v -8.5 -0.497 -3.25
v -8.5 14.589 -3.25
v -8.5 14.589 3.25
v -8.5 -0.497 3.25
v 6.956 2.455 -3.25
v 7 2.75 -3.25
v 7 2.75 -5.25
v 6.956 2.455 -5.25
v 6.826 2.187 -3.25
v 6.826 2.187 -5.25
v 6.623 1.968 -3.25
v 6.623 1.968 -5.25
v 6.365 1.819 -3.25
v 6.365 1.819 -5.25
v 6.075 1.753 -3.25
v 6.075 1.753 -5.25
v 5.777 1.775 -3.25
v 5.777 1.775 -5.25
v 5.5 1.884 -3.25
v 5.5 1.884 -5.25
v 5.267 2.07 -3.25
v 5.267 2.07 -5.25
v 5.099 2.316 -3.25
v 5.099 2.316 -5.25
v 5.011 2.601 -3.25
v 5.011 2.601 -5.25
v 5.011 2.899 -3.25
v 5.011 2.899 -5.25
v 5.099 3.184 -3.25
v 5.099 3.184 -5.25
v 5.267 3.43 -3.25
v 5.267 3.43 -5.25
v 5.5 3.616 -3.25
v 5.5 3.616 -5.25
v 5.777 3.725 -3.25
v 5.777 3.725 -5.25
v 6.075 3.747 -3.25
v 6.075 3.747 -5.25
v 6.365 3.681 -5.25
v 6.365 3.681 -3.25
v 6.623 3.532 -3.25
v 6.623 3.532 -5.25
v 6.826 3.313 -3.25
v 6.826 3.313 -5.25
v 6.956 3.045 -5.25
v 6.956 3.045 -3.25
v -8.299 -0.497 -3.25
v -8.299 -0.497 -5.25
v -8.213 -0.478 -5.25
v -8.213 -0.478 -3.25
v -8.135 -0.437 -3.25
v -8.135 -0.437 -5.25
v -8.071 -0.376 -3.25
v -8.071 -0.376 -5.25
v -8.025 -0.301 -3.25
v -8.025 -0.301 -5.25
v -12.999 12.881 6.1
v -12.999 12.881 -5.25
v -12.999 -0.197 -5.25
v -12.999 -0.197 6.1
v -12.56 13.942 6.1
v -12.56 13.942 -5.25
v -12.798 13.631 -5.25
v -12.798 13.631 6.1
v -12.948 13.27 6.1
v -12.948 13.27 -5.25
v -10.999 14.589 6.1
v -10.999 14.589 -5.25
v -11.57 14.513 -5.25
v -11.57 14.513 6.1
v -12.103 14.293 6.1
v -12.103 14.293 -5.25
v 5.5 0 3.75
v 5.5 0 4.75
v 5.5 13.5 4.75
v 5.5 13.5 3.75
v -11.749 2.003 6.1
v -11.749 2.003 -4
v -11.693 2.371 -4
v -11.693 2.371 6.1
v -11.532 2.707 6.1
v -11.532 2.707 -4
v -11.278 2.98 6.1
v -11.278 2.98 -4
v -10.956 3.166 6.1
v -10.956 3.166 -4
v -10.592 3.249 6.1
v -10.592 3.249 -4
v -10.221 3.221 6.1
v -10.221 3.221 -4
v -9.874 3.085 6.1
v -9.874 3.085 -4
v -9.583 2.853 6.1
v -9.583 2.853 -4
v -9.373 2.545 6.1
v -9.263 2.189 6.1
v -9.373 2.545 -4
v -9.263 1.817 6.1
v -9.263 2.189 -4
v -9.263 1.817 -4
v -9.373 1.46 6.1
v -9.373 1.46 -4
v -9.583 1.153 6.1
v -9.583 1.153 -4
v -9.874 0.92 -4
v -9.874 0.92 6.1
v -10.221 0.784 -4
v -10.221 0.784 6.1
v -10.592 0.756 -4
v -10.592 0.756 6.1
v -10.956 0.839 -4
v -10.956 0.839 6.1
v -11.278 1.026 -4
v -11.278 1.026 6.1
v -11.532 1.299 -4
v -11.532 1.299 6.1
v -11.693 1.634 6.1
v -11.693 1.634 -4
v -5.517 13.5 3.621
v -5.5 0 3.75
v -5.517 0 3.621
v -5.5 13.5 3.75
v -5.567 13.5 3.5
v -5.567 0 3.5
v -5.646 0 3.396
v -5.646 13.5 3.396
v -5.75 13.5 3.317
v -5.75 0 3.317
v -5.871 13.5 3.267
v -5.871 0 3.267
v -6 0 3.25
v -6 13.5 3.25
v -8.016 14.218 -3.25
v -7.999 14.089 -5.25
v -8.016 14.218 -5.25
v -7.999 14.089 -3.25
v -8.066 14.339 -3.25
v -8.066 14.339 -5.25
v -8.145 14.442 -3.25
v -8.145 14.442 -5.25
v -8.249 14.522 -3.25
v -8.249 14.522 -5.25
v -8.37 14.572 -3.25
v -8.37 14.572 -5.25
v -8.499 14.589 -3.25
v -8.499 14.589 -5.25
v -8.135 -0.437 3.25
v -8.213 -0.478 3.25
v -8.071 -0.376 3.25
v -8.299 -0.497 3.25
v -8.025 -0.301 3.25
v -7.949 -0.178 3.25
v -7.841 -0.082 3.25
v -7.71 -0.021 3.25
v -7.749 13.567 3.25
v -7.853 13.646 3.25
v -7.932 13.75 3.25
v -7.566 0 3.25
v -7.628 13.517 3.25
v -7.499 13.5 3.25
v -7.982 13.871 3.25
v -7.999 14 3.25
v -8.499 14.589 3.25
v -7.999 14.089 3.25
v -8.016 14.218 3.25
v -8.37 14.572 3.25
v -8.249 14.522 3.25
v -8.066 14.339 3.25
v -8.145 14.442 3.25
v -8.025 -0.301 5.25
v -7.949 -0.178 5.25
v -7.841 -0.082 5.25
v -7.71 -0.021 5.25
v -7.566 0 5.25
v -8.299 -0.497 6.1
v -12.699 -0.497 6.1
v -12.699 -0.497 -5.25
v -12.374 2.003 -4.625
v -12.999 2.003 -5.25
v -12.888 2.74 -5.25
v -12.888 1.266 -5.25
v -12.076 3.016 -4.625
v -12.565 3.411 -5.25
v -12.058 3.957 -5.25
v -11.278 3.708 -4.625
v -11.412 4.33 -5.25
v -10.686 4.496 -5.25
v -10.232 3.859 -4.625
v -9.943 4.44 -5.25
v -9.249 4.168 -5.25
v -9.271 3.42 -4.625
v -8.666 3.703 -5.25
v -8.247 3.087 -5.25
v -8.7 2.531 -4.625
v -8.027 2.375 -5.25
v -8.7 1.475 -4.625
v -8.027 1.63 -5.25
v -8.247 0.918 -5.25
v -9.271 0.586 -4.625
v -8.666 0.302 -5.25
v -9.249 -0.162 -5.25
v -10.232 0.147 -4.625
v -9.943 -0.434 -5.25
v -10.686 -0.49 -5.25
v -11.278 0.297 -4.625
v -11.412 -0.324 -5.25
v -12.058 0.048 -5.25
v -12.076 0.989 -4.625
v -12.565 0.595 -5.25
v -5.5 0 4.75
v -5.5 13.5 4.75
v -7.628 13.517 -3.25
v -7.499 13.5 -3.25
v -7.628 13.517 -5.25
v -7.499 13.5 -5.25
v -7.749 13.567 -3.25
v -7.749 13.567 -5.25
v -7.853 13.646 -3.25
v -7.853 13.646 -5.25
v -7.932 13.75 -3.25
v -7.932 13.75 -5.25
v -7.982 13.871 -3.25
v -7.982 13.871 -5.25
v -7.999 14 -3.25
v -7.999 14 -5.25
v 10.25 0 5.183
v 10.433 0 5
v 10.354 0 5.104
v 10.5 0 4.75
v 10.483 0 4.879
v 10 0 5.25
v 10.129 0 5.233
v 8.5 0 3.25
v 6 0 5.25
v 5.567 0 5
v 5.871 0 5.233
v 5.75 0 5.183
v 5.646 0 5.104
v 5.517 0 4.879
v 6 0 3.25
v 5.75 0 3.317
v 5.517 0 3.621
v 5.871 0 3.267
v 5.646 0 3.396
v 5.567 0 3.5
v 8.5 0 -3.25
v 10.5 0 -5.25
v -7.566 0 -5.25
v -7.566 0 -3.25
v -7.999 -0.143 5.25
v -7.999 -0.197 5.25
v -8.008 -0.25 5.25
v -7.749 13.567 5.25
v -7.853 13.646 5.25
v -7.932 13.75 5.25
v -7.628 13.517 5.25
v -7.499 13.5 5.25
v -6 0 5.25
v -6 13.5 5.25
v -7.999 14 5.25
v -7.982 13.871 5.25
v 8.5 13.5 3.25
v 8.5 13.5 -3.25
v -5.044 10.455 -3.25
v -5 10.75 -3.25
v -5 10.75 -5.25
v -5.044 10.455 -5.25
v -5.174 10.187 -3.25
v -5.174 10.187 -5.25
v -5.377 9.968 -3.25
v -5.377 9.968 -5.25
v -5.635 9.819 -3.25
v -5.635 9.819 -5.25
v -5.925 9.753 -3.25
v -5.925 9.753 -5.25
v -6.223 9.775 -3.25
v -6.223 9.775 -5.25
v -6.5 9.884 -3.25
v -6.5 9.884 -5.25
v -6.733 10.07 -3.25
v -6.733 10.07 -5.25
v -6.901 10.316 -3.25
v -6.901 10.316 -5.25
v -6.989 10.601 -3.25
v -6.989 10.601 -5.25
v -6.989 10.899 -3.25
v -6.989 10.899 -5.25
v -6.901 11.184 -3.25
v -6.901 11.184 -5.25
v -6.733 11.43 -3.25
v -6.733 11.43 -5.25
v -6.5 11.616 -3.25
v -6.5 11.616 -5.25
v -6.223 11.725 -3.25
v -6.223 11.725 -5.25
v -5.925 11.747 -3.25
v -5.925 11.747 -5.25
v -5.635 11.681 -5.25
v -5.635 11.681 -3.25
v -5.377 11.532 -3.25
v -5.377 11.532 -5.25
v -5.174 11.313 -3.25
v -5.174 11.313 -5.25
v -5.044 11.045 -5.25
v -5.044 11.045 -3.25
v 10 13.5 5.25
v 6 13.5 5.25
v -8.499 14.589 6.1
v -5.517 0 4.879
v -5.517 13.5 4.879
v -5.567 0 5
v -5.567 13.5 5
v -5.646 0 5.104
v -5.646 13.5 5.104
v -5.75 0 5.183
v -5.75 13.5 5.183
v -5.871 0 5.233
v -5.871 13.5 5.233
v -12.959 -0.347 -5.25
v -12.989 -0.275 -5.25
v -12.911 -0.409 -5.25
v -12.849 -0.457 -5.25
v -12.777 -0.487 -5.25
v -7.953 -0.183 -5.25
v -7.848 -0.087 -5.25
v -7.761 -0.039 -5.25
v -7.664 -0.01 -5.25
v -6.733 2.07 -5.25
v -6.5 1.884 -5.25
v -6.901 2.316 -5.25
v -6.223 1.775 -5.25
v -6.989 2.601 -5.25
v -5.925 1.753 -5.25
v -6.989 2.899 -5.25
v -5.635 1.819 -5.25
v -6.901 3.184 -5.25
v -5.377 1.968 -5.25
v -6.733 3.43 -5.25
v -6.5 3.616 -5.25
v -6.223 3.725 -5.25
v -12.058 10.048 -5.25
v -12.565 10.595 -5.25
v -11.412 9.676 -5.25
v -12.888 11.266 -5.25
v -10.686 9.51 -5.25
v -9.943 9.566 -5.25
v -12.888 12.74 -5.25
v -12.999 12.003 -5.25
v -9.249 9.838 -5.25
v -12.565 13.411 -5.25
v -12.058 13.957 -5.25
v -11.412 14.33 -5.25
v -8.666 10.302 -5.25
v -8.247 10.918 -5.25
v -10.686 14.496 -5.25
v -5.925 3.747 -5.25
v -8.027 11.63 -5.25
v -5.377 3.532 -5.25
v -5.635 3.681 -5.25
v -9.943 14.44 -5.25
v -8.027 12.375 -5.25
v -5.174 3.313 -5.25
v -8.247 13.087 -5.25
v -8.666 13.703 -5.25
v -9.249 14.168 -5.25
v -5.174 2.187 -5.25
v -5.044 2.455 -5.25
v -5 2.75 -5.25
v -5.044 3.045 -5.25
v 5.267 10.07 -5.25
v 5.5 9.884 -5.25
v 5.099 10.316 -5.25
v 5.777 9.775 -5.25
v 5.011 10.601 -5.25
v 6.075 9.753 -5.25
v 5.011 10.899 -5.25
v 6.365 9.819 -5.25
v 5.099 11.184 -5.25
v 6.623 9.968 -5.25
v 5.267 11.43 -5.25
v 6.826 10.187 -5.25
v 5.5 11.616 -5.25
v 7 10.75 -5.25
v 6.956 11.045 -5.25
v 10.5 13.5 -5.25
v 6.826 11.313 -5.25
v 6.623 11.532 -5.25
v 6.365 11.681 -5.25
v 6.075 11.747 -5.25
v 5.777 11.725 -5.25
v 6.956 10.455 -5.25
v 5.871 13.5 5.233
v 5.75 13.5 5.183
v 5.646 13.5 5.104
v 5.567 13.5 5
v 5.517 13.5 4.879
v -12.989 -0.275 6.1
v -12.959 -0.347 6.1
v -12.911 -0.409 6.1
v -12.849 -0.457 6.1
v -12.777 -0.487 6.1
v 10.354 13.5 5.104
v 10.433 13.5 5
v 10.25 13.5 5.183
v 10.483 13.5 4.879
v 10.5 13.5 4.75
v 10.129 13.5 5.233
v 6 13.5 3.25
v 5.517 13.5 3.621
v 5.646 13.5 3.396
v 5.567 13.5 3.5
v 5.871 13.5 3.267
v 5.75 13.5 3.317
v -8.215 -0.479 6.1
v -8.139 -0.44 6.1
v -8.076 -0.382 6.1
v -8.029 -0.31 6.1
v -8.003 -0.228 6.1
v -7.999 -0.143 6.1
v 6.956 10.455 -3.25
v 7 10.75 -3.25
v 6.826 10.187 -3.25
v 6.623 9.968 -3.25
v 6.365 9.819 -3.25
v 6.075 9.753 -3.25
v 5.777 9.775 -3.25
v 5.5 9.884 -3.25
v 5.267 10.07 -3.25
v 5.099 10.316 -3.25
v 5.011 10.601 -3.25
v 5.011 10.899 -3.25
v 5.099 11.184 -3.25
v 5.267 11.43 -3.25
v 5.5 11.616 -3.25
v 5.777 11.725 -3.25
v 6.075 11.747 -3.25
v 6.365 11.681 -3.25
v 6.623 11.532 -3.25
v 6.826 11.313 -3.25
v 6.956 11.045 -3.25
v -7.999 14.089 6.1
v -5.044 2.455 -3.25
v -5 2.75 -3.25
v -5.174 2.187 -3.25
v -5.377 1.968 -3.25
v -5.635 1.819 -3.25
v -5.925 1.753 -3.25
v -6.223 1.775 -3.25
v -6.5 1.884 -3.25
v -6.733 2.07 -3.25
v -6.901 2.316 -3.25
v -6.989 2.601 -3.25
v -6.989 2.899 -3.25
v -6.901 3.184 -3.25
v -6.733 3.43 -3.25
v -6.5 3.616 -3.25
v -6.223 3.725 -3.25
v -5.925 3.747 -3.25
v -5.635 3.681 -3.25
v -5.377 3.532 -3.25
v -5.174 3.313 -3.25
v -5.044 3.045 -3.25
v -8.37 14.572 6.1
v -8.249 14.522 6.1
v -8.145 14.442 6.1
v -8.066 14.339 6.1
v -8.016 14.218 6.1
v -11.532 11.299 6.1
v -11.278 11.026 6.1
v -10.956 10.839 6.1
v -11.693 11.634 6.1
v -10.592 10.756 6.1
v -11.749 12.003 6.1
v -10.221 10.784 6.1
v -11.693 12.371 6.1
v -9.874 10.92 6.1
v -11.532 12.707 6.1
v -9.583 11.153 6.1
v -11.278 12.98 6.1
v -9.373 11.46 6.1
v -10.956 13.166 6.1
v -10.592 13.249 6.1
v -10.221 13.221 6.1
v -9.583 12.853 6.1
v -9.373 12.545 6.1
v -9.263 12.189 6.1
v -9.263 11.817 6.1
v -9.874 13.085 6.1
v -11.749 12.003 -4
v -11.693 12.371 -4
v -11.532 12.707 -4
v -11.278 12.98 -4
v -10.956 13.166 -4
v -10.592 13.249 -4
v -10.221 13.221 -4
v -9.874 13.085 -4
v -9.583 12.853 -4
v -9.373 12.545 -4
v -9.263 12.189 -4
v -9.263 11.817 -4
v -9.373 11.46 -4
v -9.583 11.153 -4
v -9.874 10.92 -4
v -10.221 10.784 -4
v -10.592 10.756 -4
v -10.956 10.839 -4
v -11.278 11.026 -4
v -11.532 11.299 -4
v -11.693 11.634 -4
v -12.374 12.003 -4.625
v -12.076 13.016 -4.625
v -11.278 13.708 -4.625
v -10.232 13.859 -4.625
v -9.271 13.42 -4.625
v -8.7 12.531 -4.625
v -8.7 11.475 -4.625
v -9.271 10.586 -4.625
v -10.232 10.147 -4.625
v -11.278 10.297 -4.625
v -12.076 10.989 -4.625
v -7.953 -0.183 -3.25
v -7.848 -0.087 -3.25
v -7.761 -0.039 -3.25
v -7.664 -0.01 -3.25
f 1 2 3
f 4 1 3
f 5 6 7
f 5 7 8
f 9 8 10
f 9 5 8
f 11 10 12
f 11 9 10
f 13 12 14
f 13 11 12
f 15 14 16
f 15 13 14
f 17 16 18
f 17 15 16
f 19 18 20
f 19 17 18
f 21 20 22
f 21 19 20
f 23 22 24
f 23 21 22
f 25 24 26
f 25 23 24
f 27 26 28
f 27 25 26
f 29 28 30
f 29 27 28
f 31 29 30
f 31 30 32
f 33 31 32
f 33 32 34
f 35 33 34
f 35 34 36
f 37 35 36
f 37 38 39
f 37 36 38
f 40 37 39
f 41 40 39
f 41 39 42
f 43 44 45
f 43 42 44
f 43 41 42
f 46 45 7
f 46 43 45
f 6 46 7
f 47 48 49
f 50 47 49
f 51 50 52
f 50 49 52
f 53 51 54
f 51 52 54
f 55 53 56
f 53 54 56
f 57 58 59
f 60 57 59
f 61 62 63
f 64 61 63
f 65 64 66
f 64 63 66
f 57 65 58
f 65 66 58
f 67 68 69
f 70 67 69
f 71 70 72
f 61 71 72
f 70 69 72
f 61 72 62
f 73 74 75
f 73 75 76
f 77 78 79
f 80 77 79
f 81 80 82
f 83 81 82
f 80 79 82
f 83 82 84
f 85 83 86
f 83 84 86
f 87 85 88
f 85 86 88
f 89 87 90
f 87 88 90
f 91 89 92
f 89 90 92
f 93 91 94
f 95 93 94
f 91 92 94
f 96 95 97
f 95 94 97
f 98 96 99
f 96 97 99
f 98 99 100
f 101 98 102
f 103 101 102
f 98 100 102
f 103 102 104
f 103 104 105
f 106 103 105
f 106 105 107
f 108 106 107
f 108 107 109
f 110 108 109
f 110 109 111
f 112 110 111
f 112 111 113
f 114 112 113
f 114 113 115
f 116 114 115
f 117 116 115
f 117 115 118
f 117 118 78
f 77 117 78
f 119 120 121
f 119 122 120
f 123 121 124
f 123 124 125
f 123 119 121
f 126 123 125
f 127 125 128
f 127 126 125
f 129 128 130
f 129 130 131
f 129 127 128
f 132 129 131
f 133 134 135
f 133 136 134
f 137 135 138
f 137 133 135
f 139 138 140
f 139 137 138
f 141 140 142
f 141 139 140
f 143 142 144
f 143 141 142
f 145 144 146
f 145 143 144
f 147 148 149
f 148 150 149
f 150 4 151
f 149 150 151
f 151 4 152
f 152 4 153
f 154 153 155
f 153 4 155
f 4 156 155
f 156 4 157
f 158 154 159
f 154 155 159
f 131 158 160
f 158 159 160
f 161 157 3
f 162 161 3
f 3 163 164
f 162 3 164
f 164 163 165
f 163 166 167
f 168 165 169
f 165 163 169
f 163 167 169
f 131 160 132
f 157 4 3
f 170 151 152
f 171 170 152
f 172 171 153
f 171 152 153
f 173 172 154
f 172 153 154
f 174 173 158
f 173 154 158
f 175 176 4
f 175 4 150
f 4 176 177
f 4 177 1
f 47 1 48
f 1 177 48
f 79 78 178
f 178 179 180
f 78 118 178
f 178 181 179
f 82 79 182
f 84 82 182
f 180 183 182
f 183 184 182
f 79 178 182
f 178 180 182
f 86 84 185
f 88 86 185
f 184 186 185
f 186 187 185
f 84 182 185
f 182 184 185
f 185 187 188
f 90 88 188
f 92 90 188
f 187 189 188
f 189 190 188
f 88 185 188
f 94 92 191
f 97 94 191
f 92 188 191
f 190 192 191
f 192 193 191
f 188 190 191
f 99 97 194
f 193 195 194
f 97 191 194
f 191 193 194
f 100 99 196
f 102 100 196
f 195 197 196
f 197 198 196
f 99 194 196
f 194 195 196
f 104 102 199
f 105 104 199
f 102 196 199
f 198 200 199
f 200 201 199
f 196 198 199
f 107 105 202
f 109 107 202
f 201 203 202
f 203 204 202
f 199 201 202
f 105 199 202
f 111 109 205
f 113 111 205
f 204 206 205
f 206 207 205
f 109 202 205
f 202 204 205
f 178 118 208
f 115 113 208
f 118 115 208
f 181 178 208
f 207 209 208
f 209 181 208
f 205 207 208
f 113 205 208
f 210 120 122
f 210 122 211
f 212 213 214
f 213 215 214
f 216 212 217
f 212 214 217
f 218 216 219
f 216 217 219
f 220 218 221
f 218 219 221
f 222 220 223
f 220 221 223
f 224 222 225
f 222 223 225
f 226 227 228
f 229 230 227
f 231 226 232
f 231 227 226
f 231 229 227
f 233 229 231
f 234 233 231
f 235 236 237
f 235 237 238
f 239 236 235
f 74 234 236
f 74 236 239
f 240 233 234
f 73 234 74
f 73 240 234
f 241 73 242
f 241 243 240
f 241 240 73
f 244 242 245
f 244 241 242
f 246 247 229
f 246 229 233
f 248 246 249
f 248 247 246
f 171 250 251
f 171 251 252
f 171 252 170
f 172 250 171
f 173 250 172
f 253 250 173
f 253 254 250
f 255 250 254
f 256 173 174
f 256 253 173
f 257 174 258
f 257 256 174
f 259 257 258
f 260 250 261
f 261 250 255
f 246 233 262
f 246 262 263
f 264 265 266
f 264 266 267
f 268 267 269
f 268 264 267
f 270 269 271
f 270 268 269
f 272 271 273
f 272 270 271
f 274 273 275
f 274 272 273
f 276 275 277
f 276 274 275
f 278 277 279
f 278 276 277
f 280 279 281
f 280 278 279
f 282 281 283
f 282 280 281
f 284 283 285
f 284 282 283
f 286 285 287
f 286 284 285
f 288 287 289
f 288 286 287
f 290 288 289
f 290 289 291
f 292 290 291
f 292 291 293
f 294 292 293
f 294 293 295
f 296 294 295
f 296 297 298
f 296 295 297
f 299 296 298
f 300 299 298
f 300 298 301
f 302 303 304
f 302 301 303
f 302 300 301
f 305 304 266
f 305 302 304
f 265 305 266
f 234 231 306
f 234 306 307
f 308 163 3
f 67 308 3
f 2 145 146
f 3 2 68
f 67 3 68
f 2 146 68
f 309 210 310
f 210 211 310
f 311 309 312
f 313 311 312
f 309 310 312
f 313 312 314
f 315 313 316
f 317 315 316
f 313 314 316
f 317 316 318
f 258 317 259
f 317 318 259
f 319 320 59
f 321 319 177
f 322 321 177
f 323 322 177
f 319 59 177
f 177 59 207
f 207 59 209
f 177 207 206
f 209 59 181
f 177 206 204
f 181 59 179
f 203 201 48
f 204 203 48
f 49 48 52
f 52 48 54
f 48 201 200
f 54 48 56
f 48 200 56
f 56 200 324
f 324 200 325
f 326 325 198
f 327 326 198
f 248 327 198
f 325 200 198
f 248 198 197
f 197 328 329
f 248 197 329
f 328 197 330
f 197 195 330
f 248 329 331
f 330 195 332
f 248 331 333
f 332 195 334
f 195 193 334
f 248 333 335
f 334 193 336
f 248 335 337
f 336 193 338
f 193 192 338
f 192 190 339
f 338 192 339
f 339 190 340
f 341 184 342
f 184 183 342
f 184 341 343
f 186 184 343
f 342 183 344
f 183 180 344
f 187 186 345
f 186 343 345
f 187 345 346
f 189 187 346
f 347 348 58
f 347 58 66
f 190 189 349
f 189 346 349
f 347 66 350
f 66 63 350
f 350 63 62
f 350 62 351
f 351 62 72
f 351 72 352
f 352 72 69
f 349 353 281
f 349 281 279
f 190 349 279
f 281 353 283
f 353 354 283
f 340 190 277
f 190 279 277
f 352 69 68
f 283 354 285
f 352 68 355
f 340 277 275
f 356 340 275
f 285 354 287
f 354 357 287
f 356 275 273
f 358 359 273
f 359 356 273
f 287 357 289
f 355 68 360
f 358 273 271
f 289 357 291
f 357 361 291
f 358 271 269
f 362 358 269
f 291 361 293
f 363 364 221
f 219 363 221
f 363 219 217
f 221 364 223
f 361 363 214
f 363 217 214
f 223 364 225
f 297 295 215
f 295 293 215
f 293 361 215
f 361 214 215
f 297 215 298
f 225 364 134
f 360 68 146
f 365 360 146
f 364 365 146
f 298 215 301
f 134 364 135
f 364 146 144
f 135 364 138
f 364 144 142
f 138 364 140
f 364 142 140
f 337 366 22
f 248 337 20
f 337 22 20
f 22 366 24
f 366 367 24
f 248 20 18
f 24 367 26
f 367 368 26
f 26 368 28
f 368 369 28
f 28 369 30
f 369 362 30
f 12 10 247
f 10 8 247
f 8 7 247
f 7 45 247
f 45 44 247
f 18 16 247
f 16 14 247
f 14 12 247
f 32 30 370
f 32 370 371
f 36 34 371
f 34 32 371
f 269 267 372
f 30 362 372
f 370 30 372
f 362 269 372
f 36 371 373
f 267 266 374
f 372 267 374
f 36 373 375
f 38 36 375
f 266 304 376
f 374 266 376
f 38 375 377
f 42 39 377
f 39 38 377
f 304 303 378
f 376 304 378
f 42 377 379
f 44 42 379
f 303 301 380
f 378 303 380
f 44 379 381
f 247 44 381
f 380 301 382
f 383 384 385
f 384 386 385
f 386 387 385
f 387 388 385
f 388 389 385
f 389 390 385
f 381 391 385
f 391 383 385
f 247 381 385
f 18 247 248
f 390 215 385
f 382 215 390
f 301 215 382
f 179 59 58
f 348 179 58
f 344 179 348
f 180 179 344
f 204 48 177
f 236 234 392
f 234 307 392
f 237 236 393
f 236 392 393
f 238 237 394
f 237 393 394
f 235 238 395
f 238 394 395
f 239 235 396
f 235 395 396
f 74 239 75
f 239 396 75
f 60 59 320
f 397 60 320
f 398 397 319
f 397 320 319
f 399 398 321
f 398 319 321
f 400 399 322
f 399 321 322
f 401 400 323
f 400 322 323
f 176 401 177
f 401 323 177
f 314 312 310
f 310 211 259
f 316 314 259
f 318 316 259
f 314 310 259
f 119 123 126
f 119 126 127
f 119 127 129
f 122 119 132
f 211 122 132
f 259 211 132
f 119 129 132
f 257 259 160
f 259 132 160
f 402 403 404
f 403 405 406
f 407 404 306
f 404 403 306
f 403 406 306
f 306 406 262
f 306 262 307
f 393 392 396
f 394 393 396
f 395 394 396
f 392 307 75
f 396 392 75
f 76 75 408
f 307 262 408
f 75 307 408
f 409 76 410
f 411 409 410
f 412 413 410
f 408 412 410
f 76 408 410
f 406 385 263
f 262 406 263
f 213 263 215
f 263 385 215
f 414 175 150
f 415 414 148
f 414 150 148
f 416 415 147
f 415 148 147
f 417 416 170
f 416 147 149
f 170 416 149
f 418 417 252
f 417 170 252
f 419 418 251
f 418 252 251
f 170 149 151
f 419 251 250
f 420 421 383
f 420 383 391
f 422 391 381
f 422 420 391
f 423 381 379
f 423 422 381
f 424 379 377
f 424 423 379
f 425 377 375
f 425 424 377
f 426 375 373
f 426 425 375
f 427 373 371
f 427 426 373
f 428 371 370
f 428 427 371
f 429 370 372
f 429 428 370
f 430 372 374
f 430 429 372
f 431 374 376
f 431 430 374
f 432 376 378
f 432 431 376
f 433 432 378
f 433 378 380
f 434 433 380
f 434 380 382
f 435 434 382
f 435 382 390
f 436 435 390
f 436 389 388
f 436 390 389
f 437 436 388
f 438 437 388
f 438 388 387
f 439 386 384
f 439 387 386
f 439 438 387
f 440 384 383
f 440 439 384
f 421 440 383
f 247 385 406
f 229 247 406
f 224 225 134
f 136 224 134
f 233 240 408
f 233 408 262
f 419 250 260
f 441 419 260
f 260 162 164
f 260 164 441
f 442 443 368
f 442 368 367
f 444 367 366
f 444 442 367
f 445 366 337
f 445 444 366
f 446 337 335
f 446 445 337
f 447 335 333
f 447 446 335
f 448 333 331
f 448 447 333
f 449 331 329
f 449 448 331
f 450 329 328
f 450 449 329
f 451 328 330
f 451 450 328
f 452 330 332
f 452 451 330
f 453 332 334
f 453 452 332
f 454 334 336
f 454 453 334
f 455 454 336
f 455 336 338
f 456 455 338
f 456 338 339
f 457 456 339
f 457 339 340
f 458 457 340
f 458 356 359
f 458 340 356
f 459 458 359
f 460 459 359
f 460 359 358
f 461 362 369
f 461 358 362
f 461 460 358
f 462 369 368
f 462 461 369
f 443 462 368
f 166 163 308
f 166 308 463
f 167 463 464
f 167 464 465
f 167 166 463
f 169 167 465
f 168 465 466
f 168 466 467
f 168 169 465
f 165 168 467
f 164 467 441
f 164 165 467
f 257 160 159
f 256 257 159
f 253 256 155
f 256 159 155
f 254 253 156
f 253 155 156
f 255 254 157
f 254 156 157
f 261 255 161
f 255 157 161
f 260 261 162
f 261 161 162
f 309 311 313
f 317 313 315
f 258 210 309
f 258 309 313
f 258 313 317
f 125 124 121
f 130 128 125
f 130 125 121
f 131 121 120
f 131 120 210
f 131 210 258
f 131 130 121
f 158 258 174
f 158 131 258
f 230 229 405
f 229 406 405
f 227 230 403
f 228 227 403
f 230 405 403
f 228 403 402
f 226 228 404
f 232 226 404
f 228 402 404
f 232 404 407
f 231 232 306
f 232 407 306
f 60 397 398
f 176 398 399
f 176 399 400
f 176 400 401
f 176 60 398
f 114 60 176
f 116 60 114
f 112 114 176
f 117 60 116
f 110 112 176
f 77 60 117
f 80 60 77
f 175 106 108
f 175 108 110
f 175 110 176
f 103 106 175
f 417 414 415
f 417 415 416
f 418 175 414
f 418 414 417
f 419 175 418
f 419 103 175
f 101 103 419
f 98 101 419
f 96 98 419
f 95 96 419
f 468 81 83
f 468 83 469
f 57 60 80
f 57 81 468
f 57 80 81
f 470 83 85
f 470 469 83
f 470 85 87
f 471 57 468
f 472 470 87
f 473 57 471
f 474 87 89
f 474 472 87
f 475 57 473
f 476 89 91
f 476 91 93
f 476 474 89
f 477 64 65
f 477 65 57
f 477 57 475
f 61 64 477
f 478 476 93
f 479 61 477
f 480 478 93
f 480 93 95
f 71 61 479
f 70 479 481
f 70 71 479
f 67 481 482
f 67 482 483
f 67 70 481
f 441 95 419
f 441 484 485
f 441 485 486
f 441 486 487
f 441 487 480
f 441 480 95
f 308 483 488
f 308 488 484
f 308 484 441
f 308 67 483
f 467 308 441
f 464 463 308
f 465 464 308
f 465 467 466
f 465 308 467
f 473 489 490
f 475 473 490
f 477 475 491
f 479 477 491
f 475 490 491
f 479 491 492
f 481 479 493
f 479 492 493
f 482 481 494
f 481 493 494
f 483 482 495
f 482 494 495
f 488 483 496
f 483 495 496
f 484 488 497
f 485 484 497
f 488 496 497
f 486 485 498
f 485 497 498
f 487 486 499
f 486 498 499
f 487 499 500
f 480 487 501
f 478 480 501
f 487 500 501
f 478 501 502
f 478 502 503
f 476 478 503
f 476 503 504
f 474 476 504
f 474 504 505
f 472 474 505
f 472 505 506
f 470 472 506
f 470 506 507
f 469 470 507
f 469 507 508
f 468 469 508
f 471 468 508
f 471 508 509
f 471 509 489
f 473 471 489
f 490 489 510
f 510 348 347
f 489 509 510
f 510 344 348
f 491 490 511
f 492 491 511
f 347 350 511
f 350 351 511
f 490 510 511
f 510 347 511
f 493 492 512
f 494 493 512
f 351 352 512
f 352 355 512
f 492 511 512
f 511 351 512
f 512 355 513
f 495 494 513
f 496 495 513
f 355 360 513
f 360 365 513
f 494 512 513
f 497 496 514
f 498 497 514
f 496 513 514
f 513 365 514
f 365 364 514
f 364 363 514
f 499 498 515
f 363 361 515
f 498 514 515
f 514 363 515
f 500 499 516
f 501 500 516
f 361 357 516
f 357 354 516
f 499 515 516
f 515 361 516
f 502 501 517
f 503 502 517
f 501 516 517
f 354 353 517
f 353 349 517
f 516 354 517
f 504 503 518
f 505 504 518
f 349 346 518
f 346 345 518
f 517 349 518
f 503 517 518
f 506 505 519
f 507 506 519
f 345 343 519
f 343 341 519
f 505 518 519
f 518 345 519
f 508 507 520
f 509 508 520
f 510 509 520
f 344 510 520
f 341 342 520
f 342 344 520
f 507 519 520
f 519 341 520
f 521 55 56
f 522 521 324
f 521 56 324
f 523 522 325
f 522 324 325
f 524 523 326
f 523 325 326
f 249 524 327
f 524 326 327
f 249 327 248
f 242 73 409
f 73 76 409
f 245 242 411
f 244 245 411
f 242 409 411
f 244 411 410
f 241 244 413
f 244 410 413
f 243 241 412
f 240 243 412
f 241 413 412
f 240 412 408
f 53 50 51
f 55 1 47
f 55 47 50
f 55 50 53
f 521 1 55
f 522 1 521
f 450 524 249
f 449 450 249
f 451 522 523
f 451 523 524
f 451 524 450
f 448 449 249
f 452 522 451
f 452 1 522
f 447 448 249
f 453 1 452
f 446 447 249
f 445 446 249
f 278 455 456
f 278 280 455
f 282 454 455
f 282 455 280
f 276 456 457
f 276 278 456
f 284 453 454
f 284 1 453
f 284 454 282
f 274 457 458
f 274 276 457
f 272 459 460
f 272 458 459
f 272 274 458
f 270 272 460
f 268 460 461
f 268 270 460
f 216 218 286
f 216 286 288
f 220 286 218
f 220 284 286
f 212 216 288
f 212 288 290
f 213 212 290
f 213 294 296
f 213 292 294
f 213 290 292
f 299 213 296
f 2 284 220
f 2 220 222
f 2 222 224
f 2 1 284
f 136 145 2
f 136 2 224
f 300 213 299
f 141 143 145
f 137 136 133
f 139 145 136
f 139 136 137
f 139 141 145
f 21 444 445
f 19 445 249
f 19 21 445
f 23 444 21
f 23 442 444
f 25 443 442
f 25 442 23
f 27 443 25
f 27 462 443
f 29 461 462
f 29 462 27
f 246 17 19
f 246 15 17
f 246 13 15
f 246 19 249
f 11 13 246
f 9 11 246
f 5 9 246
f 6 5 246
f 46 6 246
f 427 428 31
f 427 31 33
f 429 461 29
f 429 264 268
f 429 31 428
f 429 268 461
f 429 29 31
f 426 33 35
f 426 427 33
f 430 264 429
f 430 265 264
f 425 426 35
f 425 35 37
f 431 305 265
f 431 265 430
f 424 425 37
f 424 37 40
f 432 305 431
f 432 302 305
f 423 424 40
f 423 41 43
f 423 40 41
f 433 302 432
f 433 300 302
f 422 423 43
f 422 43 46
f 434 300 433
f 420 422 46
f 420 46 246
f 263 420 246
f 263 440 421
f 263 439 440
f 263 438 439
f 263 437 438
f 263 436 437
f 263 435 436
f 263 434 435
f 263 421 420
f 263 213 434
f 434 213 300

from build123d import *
from OCP.BRepAlgoAPI import BRepAlgoAPI_Cut
from OCP.TopTools import TopTools_ListOfShape

# Parameters (mm, degrees)
EXTRUDE_1_DEPTH          = 13.5
FILLET_1_R               = 0.5
CUT_EXTRUDE_1_DEPTH      = 2
CUT_EXTRUDE_1_DEPTH_BACK = 3.5
SKETCH_2_R               = 1
EXTRUDE_3_DEPTH          = 11.35
CUT_EXTRUDE_START        = -15.085786
SKETCH_14_W              = 17
SKETCH_14_H              = 6.5
CUT_EXTRUDE_7_DEPTH      = 15.085786
CUT_EXTRUDE_8_DEPTH      = 2
CUT_EXTRUDE_8_DEPTH_BACK = 15.5
SKETCH_15_R              = 1.150968548
SKETCH_15_R_2            = 1.118586154
FILLET_2_R               = 0.5
FILLET_START             = -5.25
FILLET_3_DEPTH           = 12.25
FILLET_START_2           = 3.25
FILLET_3_2_DEPTH         = 2
SKETCH_16_R              = 1.25
CUT_EXTRUDE_9_DEPTH      = 23.596980066
CHAMFER_2_SIZE           = 1.25


with BuildPart() as part:
    # 草图1 → 凸台-拉伸1 (new body)
    with BuildSketch(Plane(origin=(0, 0, 0), x_dir=(1, 0, 0), z_dir=(0, 1, 0))):
        Polygon((-5.5, -3.25), (-5.5, -5.25), (-10.5, -5.25), (-10.5, 5.25), (10.5, 5.25), (10.5, -5.25), (5.5, -5.25), (5.5, -3.25), (8.5, -3.25), (8.5, 3.25), (-8.5, 3.25), (-8.5, -3.25), align=None)
    extrude(amount=EXTRUDE_1_DEPTH)

    # 圆角1
    fillet_1_edges = [part.edges().sort_by_distance(p)[0] for p in [
        (-5.5, 6.75, 3.25),
        (-5.5, 6.75, 5.25),
        (-10.5, 6.75, 5.25),
        (10.5, 6.75, 5.25),
        (5.5, 6.75, 5.25),
        (5.5, 6.75, 3.25),
    ]]
    fillet(fillet_1_edges, radius=FILLET_1_R)

    # 草图2 → 切除-拉伸1 (cut, two sides: drawn at the far end of the back side and taken through both)
    with BuildSketch(Plane(origin=(0, 0, -5.25), x_dir=(-1, 0, 0), z_dir=(0, 0, -1)).offset(-CUT_EXTRUDE_1_DEPTH_BACK)):
        with Locations(Location((-6, 10.75, 0), (0, 0, 180))):
            Circle(SKETCH_2_R)
        with Locations(Location((6, 10.75, 0), (0, 0, 180))):
            Circle(SKETCH_2_R)
        with Locations(Location((6, 2.75, 0), (0, 0, 180))):
            Circle(SKETCH_2_R)
        with Locations(Location((-6, 2.75, 0), (0, 0, 180))):
            Circle(SKETCH_2_R)
    extrude(amount=CUT_EXTRUDE_1_DEPTH + CUT_EXTRUDE_1_DEPTH_BACK, mode=Mode.SUBTRACT)

    # 草图13 → 凸台-拉伸3 (add)
    with BuildSketch(Plane(origin=(0, 0, -5.25), x_dir=(-1, 0, 0), z_dir=(0, 0, -1))):
        with BuildLine():
            Line((7.999, -0.142846655), (7.999, 14.588591487))
            Line((7.999, 14.588591487), (10.999, 14.588591487))
            ThreePointArc((10.999, 14.588591487), (11.843623199, 14.420585487), (12.559660172, 13.942144877))
            ThreePointArc((12.559660172, 13.942144877), (12.884819299, 13.455509854), (12.999, 12.881484706))
            Line((12.999, 12.881484706), (12.999, -0.197194951))
            ThreePointArc((12.999, -0.197194951), (12.911132034, -0.409326985), (12.699, -0.497194951))
            Line((12.699, -0.497194951), (8.299, -0.497194951))
            ThreePointArc((8.299, -0.497194951), (8.075612065, -0.382152837), (7.999, -0.142846655))
        make_face()
    extrude(amount=-EXTRUDE_3_DEPTH)


with BuildPart() as cut_extrude_7_tool:
    # 草图14 → 切除-拉伸7 (new body)
    with BuildSketch(Plane.XZ.offset(0.497194951).offset(CUT_EXTRUDE_START)):
        Rectangle(SKETCH_14_W, SKETCH_14_H)
    extrude(amount=CUT_EXTRUDE_7_DEPTH)


with BuildPart() as part_1:
    add(part.part)

    # 切除-拉伸7: cut by cut_extrude_7_tool, with a tolerance
    cut_extrude_7_stock = TopTools_ListOfShape()
    cut_extrude_7_stock.Append(part_1.part.wrapped)
    cut_extrude_7_tools = TopTools_ListOfShape()
    cut_extrude_7_tools.Append(cut_extrude_7_tool.part.wrapped)
    cut_extrude_7_cut = BRepAlgoAPI_Cut()
    cut_extrude_7_cut.SetArguments(cut_extrude_7_stock)
    cut_extrude_7_cut.SetTools(cut_extrude_7_tools)
    cut_extrude_7_cut.SetFuzzyValue(0.00001)
    cut_extrude_7_cut.Build()
    add(Compound.cast(cut_extrude_7_cut.Shape()).solids(), mode=Mode.REPLACE)

    # 草图15 → 切除-拉伸8 (cut, two sides: drawn at the far end of the back side and taken through both)
    with BuildSketch(Plane.XY.offset(6.1).offset(-CUT_EXTRUDE_8_DEPTH_BACK)):
        with Locations(Location((-10.499, 12.002805049, 0), (0, 0, 180))):
            Circle(SKETCH_15_R)
        with Locations(Location((-10.499, 2.002805049, 0), (0, 0, 180))):
            Circle(SKETCH_15_R_2)
    extrude(amount=CUT_EXTRUDE_8_DEPTH + CUT_EXTRUDE_8_DEPTH_BACK, mode=Mode.SUBTRACT)

    # 圆角2
    fillet_2_edges = [part_1.edges().sort_by_distance(p)[0] for p in [
        (-7.999, 14.588591487, -4.25),
        (-7.999, 13.5, -4.25),
        (-7.999, 0, -4.25),
    ]]
    fillet(fillet_2_edges, radius=FILLET_2_R)

    # 圆角3: read off the stored shape, not the designer's step
    # 圆角3 outline → 圆角3 (cut)
    with BuildSketch(Plane.XY.offset(FILLET_START)):
        with BuildLine():
            Line((-7.999, 14.588591487), (-8.499, 14.588591487))
            ThreePointArc((-8.499, 14.588591487), (-8.14544661, 14.442144878), (-7.999, 14.088591487))
            Line((-7.999, 14.088591487), (-7.999, 14.588591487))
        make_face()
    extrude(amount=FILLET_3_DEPTH, mode=Mode.SUBTRACT)

    # Fillet 3 2 outline → Fillet 3 2 (add)
    with BuildSketch(Plane.XY.offset(FILLET_START_2)):
        with BuildLine():
            Line((-7.566440116, 0), (-7.999, 0))
            Line((-7.999, 0), (-7.999, -0.142846655))
            ThreePointArc((-7.999, -0.142846655), (-8.00224868, -0.223440354), (-8.025050148, -0.300809542))
            ThreePointArc((-8.025050148, -0.300809542), (-7.840670649, -0.081911954), (-7.566440116, 0))
        make_face()
        with BuildLine():
            ThreePointArc((-7.499, 13.5), (-7.852553391, 13.646446609), (-7.999, 14))
            Line((-7.999, 14), (-7.999, 13.5))
            Line((-7.999, 13.5), (-7.499, 13.5))
        make_face()
    extrude(amount=FILLET_3_2_DEPTH)

    # 草图16 → 切除-拉伸9 (cut, through all)
    with BuildSketch(Plane(origin=(0, 0, -5.25), x_dir=(-1, 0, 0), z_dir=(0, 0, -1))):
        with Locations((10.499, 12.002805049)):
            Circle(SKETCH_16_R)
        with Locations((10.499, 2.002805049)):
            Circle(SKETCH_16_R)
    extrude(amount=-CUT_EXTRUDE_9_DEPTH, mode=Mode.SUBTRACT)

    # 倒角2
    chamfer_2_edges = [part_1.edges().sort_by_distance(p)[0] for p in [
        (-9.249, 12.002805049, -5.25),
        (-9.249, 2.002805049, -5.25),
    ]]
    chamfer(chamfer_2_edges, length=CHAMFER_2_SIZE - 0.0001)  # a hair under: the kernel refuses the full size


solid = part_1.part
